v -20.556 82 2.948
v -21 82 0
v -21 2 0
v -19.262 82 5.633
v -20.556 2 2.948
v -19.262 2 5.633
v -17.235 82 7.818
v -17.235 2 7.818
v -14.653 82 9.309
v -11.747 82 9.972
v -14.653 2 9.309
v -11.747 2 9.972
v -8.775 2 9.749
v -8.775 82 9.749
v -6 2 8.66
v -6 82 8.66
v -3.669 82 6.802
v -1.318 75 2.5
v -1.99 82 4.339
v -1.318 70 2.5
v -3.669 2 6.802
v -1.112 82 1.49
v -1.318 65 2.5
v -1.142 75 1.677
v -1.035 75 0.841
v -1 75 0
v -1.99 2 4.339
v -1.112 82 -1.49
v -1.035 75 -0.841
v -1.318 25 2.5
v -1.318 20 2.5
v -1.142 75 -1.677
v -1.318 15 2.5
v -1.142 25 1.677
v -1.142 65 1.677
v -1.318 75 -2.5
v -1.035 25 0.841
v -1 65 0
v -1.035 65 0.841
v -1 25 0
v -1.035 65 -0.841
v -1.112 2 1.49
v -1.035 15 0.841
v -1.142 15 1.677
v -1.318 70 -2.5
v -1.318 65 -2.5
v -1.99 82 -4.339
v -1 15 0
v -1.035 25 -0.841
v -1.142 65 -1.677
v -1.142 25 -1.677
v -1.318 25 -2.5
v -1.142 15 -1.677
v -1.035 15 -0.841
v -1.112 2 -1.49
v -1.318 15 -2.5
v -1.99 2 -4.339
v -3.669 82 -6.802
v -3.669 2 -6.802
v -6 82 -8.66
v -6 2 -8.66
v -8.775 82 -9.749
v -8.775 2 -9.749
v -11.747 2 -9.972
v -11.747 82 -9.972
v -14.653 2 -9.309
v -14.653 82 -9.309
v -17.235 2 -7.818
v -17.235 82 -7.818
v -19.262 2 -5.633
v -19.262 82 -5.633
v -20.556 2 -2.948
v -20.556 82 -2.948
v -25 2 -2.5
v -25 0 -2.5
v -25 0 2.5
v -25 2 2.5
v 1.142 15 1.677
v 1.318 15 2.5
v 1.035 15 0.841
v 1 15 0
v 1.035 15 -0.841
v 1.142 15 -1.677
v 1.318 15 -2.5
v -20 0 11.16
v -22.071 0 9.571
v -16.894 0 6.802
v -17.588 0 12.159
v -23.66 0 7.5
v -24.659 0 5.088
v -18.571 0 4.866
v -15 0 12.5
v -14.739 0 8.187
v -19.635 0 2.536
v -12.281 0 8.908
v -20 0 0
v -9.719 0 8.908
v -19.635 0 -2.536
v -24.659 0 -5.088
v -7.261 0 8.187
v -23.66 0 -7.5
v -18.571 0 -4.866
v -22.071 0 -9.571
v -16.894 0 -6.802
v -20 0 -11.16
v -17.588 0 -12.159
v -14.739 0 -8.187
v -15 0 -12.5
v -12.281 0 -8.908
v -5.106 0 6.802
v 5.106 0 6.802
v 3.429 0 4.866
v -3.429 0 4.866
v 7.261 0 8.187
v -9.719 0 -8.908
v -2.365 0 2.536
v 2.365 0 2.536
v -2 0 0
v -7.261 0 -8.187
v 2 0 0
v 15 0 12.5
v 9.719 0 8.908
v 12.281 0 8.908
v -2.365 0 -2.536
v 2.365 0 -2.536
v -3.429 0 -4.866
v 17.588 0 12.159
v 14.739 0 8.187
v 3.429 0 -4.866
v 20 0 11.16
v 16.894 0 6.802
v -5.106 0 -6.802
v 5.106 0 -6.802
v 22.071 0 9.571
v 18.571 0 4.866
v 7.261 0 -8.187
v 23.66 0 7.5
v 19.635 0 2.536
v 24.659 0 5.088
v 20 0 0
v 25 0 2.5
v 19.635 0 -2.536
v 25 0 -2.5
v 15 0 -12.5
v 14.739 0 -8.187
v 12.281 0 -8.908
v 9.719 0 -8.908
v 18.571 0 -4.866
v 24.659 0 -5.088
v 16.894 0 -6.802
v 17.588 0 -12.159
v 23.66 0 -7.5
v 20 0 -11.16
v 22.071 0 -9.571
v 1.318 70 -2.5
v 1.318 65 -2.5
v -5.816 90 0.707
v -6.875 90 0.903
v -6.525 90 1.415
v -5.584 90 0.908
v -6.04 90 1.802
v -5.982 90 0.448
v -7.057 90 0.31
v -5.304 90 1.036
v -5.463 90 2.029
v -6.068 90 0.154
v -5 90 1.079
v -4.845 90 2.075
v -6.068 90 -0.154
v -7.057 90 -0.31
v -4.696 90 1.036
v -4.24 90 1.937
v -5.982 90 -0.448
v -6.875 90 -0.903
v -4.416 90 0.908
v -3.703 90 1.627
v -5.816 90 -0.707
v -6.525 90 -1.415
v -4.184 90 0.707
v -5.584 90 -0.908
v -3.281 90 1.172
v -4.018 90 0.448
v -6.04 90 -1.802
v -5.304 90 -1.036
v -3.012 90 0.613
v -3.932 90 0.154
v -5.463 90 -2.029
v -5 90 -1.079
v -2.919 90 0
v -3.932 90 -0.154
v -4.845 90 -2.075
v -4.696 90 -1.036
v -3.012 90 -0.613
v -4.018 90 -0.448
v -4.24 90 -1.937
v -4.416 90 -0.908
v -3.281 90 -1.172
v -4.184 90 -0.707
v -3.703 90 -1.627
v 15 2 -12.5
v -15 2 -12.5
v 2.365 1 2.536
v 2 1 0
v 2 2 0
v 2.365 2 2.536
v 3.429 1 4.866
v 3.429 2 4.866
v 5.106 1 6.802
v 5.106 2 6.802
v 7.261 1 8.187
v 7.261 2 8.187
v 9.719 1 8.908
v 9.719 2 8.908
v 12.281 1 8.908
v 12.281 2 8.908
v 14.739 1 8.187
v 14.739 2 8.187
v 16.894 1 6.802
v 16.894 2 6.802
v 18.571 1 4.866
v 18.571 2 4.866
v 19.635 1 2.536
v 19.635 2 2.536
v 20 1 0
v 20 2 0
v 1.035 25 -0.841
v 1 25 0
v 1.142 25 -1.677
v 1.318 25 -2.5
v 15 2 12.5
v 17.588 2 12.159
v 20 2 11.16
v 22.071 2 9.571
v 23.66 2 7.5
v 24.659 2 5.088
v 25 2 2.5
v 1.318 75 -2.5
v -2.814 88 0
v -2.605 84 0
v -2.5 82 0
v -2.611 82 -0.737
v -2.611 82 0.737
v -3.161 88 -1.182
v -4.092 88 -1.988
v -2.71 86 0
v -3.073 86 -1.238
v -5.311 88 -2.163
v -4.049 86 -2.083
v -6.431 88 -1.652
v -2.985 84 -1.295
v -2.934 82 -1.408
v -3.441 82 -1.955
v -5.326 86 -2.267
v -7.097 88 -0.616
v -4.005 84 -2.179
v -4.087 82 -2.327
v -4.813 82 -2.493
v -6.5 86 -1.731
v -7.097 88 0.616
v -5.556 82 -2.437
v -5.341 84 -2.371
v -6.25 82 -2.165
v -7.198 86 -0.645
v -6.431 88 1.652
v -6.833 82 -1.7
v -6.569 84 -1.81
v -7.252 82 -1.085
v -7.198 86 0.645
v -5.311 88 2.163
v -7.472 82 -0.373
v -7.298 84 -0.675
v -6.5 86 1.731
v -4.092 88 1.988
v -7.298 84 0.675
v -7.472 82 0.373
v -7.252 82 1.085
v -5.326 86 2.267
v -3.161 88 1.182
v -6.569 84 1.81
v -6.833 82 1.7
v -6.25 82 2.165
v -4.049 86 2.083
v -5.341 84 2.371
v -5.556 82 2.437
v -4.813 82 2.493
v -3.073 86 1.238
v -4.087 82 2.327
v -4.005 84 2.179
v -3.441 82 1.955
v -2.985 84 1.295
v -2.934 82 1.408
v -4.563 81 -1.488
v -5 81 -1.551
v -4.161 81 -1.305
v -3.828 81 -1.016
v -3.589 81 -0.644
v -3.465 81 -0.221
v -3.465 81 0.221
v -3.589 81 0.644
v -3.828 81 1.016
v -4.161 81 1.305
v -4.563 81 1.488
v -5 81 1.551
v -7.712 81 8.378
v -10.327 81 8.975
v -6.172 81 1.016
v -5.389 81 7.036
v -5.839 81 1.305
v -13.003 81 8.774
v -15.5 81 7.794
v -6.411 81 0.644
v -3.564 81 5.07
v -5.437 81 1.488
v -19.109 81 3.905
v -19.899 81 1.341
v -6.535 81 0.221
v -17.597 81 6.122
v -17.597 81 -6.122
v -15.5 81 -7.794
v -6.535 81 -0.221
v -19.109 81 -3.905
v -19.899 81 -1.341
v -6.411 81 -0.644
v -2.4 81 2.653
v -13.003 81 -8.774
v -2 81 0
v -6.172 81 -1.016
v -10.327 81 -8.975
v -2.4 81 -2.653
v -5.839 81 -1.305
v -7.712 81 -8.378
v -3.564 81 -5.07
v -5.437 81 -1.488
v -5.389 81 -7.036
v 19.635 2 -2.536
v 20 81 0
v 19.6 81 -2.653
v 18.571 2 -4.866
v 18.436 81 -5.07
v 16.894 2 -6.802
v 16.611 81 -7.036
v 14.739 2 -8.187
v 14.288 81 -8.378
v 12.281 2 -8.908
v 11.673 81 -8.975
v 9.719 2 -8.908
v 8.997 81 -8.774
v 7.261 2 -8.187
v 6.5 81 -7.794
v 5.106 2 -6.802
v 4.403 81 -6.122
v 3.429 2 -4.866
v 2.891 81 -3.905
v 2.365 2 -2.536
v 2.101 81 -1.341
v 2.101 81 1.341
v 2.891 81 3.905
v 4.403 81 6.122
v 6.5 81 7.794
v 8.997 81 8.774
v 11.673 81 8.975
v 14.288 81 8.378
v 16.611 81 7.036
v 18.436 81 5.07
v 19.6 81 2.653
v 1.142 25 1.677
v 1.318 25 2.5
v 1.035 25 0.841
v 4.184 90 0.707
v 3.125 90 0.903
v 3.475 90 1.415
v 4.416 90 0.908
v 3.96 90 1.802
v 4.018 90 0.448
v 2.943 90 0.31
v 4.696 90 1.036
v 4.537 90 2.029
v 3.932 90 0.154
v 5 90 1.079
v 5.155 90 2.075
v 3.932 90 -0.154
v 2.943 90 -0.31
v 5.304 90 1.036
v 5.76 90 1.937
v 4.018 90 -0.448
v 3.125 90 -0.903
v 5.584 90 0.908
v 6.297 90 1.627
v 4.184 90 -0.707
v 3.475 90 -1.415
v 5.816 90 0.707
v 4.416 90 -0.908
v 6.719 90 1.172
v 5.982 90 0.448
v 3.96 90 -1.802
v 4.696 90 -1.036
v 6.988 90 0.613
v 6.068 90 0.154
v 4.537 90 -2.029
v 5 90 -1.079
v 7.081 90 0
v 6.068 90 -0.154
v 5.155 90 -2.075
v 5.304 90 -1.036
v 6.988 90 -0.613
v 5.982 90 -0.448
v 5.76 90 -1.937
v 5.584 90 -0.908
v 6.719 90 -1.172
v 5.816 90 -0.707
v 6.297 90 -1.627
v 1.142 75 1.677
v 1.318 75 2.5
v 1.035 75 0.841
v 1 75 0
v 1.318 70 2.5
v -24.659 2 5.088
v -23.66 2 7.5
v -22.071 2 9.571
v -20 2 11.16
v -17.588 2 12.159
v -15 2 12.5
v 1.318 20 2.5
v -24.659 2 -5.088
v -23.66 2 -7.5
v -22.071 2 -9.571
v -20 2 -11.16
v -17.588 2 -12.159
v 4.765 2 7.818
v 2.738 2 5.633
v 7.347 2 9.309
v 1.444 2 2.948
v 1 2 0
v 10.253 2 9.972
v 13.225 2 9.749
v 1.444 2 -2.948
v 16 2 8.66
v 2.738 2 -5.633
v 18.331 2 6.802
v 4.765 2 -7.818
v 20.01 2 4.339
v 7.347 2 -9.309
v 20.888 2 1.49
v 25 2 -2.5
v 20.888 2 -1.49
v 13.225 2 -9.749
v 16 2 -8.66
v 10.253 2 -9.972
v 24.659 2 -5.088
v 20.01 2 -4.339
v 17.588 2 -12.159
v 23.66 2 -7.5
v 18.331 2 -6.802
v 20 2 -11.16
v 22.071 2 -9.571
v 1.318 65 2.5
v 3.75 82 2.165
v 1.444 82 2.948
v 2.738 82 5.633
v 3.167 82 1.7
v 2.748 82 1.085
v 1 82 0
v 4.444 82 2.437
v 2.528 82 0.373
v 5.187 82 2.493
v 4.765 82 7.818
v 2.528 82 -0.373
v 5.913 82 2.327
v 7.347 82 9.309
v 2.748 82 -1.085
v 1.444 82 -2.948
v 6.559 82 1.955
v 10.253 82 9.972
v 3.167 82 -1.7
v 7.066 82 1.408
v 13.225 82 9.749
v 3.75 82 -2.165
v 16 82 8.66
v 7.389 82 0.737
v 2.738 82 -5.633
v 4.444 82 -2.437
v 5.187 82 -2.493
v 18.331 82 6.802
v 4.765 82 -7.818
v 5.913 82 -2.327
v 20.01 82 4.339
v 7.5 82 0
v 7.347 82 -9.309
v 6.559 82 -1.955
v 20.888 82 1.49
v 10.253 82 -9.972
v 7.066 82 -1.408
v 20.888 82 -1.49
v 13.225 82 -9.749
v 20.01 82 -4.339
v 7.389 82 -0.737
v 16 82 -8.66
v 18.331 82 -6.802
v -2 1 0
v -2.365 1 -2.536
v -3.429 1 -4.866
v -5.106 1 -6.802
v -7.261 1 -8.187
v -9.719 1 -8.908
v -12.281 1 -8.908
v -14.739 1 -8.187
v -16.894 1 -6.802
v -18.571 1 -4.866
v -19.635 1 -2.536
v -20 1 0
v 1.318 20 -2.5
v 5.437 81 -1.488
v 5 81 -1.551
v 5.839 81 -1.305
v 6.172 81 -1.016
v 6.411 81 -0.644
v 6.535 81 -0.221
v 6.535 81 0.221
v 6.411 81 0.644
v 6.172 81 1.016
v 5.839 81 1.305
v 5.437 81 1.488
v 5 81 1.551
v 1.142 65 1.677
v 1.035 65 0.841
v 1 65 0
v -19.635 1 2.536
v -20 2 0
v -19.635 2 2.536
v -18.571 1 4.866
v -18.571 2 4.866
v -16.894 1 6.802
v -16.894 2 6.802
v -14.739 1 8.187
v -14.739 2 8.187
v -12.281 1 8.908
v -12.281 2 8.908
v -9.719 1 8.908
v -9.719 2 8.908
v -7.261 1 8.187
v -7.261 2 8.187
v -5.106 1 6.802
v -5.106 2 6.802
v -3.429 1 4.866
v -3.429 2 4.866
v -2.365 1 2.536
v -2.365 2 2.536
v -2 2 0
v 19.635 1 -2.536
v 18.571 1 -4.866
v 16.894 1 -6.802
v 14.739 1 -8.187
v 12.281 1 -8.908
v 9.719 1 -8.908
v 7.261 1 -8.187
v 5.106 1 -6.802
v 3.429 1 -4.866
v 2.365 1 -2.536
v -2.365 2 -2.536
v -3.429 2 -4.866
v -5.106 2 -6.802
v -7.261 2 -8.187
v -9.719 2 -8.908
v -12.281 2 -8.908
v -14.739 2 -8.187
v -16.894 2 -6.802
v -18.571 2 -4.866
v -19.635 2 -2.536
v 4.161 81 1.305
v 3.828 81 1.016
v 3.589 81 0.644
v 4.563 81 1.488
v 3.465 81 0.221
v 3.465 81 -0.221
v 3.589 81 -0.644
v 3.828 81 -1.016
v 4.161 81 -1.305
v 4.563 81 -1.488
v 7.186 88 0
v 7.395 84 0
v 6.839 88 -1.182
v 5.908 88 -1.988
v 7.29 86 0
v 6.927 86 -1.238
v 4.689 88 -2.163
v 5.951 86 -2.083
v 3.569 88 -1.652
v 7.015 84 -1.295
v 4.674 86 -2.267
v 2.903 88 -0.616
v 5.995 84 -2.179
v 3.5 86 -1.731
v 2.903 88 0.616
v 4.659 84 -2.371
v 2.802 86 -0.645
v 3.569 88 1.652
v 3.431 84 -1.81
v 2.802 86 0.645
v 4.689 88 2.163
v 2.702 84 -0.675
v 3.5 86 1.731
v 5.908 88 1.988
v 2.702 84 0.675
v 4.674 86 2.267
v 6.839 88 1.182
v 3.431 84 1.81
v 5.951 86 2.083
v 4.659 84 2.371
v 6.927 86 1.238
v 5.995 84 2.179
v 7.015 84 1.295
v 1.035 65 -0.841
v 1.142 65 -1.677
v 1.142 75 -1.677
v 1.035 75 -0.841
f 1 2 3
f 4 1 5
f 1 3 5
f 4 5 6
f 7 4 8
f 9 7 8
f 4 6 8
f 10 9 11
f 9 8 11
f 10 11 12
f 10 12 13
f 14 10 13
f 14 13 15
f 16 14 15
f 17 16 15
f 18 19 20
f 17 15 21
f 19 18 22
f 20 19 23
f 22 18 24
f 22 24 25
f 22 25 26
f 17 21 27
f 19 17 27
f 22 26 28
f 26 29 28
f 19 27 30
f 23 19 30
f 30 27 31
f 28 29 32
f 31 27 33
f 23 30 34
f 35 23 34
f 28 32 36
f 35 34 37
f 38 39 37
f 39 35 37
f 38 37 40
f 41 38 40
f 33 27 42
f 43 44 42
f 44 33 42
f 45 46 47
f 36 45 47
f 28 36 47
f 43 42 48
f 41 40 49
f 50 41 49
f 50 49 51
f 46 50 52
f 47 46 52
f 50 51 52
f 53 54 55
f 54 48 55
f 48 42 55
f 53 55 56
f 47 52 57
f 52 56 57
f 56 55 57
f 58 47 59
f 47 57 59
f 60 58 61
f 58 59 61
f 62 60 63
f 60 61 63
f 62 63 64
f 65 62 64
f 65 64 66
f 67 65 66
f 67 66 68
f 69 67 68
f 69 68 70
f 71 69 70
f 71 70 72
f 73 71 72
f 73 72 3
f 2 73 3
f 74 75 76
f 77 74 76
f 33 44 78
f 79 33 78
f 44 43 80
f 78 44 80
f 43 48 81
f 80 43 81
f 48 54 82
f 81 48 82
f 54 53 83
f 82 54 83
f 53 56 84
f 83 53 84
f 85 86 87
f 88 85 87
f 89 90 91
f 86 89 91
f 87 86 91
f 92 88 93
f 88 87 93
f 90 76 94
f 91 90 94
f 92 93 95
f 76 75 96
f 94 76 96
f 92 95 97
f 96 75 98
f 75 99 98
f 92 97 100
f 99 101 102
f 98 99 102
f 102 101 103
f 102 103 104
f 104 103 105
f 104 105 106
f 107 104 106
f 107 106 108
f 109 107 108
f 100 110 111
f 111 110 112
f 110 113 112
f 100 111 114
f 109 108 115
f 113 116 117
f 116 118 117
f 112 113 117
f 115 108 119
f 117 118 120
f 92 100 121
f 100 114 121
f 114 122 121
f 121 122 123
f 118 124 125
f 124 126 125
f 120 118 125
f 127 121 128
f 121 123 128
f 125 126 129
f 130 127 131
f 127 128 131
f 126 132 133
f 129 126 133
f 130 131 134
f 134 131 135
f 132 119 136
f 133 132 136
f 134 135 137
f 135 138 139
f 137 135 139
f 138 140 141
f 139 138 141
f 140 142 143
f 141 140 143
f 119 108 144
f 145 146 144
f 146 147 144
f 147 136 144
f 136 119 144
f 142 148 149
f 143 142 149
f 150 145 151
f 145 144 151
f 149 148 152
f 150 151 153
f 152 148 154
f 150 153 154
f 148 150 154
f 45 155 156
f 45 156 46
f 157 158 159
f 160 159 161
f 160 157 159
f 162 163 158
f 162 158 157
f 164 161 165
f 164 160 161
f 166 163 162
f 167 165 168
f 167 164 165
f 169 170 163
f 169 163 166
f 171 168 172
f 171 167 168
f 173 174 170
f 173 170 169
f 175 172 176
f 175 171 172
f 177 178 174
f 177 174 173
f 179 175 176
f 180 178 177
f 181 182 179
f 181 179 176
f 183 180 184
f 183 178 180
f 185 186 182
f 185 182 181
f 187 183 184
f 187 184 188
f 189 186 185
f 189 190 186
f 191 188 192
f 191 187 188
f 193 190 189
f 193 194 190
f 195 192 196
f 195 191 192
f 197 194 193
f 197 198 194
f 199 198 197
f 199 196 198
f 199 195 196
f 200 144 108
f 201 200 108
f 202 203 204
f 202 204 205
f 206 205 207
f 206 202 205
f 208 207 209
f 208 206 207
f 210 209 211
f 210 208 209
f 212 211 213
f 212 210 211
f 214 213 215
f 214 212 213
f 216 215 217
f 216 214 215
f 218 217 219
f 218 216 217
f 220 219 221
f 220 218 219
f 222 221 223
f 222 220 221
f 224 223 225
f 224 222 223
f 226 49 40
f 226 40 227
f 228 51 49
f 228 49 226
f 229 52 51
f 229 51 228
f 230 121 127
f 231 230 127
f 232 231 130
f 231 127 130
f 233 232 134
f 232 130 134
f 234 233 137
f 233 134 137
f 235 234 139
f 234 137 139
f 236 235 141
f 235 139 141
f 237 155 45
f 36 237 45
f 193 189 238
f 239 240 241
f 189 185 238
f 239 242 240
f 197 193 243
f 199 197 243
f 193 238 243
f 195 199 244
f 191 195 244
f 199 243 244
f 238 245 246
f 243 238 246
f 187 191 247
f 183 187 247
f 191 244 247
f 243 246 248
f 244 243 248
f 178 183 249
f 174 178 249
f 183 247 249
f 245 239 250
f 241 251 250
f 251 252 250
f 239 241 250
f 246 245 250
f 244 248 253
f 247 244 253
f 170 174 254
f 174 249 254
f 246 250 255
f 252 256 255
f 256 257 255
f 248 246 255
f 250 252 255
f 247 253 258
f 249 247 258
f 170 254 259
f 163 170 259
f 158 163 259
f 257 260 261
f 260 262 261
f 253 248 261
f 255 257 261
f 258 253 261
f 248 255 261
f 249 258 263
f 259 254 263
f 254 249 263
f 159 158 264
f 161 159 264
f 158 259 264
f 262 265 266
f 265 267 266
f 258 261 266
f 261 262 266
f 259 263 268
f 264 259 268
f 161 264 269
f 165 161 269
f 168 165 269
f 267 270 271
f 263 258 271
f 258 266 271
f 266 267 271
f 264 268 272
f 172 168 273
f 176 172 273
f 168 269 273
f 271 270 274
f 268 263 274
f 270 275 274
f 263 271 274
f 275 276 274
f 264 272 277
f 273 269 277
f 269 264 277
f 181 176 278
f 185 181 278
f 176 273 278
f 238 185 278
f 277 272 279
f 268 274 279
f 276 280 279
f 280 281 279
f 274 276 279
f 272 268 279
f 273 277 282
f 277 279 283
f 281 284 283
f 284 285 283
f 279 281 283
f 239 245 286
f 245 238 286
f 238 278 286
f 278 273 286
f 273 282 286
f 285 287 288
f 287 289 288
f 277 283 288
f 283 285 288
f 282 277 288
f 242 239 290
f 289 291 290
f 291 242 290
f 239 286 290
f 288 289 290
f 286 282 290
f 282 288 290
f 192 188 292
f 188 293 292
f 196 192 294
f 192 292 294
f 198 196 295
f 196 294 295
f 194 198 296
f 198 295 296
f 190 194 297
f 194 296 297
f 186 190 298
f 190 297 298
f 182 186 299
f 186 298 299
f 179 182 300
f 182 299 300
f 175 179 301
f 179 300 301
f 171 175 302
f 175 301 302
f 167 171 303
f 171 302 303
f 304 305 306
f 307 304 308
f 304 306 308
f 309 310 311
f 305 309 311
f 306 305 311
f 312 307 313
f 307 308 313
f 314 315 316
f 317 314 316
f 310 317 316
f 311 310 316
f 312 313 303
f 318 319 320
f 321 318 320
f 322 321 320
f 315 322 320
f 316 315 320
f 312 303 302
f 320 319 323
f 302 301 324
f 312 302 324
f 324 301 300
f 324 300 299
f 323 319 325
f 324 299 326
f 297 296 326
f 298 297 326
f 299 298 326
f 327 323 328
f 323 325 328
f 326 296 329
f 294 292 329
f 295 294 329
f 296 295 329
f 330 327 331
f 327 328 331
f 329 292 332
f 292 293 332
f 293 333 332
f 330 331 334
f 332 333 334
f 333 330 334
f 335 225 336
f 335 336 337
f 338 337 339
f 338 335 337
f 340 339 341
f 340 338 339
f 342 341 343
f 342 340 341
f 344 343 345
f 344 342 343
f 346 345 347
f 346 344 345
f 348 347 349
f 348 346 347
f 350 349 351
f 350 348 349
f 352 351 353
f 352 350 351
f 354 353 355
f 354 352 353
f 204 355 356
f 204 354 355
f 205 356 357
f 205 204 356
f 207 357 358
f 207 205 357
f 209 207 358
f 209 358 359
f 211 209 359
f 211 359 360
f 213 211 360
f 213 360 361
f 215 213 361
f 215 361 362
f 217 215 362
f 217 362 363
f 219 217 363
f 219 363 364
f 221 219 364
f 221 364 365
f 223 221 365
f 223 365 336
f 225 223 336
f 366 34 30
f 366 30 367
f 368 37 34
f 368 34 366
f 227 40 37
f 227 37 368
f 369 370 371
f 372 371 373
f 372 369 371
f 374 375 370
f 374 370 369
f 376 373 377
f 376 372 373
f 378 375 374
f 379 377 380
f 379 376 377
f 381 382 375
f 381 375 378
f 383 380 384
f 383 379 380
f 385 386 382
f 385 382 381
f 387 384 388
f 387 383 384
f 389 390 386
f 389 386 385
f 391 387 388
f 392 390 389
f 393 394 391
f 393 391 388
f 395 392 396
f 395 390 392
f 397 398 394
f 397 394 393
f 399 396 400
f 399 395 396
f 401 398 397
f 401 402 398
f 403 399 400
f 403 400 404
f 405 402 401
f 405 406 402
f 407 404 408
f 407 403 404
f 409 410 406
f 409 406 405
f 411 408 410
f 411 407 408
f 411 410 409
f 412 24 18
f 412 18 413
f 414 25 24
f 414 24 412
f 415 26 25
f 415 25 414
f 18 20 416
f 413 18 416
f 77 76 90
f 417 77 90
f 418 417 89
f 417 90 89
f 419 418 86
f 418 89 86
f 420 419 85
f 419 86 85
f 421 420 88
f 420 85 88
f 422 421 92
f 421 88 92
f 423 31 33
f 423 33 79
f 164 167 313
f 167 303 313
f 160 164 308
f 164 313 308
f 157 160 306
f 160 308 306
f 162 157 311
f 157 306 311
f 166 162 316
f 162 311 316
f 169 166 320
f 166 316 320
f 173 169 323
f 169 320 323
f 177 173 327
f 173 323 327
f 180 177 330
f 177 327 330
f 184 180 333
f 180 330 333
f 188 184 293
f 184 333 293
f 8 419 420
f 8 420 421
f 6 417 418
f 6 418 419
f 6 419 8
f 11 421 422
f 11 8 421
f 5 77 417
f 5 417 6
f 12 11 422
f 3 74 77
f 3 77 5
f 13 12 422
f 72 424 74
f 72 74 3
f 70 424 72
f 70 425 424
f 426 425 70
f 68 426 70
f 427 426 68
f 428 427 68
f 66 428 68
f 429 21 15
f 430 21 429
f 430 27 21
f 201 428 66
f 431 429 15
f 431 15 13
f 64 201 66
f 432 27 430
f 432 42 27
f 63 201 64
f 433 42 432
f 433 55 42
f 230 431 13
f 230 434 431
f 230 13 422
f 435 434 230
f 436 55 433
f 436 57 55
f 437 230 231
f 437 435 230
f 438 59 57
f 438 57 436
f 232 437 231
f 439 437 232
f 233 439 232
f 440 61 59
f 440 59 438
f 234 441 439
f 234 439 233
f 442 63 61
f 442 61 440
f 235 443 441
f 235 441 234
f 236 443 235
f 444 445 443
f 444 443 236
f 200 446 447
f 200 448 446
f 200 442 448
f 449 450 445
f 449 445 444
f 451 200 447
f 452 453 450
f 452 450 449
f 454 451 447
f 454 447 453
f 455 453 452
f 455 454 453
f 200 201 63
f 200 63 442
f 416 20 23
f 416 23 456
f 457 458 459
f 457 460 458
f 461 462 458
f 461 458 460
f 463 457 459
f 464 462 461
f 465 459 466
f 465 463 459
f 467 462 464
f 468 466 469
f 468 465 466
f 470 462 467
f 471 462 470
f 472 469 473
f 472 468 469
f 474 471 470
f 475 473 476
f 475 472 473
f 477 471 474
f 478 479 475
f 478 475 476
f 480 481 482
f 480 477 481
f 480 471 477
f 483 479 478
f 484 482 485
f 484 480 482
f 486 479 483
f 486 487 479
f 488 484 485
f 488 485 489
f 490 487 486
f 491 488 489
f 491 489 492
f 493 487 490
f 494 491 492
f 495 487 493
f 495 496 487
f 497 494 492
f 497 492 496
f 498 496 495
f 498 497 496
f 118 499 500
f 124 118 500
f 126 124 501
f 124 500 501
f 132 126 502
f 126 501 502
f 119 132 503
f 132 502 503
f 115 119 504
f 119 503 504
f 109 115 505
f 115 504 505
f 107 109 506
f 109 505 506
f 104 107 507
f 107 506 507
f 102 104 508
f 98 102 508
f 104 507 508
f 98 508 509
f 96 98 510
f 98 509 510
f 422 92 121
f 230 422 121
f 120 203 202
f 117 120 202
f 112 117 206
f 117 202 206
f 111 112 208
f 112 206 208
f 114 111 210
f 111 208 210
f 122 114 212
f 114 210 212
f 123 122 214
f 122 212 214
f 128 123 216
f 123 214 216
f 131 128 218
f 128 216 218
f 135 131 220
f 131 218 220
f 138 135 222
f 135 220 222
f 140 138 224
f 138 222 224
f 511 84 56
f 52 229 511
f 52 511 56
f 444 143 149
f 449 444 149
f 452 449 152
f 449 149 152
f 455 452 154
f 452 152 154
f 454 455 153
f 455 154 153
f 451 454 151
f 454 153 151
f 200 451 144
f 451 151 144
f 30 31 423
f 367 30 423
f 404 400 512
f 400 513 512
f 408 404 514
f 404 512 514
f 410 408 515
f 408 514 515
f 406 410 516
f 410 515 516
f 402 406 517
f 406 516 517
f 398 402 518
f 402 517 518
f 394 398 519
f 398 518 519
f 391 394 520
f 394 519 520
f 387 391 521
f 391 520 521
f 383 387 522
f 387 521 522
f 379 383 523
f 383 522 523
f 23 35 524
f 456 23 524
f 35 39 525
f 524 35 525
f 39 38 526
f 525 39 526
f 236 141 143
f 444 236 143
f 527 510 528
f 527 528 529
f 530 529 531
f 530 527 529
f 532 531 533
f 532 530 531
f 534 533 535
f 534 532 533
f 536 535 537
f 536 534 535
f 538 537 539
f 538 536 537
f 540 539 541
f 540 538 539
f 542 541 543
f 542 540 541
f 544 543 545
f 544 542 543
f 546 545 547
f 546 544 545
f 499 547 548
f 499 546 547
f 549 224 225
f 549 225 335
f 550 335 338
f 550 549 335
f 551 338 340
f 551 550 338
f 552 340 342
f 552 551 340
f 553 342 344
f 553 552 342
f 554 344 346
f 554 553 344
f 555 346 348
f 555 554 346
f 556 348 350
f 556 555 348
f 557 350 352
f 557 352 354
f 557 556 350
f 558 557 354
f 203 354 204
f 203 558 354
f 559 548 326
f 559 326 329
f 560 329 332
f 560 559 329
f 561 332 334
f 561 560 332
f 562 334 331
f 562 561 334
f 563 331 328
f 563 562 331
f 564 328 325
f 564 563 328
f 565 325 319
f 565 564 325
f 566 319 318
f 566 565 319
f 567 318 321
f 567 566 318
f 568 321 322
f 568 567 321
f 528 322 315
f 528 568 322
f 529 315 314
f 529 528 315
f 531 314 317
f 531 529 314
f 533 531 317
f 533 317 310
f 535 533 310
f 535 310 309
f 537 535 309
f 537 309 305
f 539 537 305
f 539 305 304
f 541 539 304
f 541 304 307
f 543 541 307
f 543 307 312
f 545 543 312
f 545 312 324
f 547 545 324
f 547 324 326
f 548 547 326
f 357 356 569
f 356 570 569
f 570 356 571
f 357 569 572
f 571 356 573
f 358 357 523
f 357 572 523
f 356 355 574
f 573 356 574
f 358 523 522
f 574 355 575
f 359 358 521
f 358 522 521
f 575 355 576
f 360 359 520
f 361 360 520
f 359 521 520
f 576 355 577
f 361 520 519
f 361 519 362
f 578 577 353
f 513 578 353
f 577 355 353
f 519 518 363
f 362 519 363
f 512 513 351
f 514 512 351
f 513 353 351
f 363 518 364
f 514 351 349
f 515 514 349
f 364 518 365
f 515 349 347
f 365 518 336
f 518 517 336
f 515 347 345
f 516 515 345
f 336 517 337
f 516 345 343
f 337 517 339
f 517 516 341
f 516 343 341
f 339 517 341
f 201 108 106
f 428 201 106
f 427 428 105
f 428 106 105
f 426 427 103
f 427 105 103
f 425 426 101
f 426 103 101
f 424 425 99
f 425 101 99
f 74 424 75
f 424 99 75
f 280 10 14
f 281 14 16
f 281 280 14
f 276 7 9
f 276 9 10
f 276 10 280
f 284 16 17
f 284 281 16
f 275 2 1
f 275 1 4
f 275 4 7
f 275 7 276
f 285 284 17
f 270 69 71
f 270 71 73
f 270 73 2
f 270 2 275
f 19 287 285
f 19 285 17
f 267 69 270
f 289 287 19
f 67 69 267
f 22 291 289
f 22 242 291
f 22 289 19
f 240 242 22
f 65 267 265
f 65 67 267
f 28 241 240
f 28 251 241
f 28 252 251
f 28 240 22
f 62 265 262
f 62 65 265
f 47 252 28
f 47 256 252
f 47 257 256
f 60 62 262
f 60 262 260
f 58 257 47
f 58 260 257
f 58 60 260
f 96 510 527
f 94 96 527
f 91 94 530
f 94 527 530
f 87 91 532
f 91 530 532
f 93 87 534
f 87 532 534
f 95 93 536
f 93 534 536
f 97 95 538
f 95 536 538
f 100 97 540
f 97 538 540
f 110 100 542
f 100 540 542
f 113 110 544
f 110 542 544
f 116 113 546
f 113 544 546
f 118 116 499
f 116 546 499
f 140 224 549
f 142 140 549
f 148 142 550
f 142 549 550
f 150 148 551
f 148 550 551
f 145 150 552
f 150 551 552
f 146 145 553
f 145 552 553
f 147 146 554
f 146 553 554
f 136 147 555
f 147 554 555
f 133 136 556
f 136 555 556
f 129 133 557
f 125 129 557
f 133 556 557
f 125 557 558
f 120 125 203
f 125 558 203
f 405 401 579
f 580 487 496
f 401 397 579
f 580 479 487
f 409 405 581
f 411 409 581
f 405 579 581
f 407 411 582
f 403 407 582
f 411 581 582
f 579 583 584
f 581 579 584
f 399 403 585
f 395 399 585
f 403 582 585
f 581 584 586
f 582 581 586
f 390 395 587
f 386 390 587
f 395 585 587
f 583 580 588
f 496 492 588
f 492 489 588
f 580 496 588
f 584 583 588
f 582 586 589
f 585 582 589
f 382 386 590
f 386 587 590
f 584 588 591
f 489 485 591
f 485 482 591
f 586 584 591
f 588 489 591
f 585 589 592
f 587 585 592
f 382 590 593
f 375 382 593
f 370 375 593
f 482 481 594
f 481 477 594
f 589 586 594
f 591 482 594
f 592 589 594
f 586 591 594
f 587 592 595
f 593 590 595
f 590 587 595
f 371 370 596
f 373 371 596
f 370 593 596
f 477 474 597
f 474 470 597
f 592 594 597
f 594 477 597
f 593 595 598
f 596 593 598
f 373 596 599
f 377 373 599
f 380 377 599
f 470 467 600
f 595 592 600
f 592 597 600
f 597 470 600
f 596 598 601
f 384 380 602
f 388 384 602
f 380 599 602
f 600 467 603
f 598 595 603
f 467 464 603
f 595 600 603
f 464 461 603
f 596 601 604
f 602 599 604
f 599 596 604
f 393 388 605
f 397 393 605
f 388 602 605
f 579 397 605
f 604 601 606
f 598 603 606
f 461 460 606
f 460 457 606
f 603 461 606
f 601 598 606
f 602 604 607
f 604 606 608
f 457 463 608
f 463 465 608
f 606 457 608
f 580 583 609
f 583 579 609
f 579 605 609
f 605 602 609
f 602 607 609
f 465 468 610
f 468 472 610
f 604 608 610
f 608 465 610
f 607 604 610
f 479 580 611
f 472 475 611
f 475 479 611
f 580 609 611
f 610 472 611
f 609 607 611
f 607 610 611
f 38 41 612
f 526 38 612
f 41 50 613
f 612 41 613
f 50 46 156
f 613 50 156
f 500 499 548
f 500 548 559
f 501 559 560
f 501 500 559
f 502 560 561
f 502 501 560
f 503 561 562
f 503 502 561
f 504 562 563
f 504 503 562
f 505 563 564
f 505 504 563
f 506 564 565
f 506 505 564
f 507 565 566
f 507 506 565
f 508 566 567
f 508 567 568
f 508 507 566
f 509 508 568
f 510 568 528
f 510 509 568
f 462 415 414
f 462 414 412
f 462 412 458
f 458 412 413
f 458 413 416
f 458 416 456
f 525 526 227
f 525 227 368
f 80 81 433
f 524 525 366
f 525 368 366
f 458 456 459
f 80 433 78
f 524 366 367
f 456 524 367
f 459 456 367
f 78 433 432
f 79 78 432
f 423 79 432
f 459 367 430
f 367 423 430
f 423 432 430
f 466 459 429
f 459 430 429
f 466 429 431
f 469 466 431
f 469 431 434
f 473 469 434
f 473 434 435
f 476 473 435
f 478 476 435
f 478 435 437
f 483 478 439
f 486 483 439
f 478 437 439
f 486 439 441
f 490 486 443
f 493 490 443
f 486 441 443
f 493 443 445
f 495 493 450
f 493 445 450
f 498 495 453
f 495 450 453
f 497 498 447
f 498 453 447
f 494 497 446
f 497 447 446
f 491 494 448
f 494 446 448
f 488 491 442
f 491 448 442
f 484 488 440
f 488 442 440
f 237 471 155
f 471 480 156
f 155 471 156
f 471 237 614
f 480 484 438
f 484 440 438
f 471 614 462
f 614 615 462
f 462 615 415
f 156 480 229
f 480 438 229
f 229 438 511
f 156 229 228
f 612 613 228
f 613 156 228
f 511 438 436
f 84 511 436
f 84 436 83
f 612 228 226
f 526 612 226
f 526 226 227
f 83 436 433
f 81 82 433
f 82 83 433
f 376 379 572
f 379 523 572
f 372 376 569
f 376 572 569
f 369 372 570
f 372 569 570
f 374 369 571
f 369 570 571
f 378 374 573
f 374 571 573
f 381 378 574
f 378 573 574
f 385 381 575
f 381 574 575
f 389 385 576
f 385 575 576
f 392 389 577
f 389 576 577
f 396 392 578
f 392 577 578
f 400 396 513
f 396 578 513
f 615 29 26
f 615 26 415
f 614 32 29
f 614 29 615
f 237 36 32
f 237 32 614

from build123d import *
from build123d.topology import SkipClean

# Parameters (mm, degrees)
BOSS_EXTRUDE1_DEPTH           = 2
BOSS_EXTRUDE2_DEPTH           = 80
SKETCH3_R                     = 2.5
BOSS_EXTRUDE3_DEPTH           = 8
BOSS_EXTRUDE3_DRAFT           = 3
BOSS_EXTRUDE3_PROFILE_2_DEPTH = 8
BOSS_EXTRUDE3_PROFILE_2_DRAFT = 3
SHELL2_START                  = 1
SHELL2_OUTLINE_R              = 9
SHELL2_DEPTH                  = 80
CUT_EXTRUDE1_DEPTH            = 93.332280474
BOSS_EXTRUDE4_DEPTH           = 5
BOSS_EXTRUDE5_DEPTH           = 5


with BuildPart() as part:
    # Sketch1 → Boss-Extrude1 (new body)
    with BuildSketch(Plane(origin=(0, 0, 0), x_dir=(1, 0, 0), z_dir=(0, 1, 0))):
        with BuildLine():
            Line((-15, -12.5), (15, -12.5))
            ThreePointArc((15, -12.5), (22.071067812, -9.571067812), (25, -2.5))
            Line((25, -2.5), (25, 2.5))
            ThreePointArc((25, 2.5), (22.071067812, 9.571067812), (15, 12.5))
            Line((15, 12.5), (-15, 12.5))
            ThreePointArc((-15, 12.5), (-22.071067812, 9.571067812), (-25, 2.5))
            Line((-25, 2.5), (-25, -2.5))
            ThreePointArc((-25, -2.5), (-22.071067812, -9.571067812), (-15, -12.5))
        make_face()
    extrude(amount=BOSS_EXTRUDE1_DEPTH)

    # Sketch2 → Boss-Extrude2 (add)
    with BuildSketch(Plane(origin=(0, 2, 0), x_dir=(1, 0, 0), z_dir=(0, 1, 0))):
        with BuildLine():
            ThreePointArc((-20, 0), (-11, 9), (-2, 0))
            Line((-2, 0), (-1, 0))
            ThreePointArc((-1, 0), (-11, 10), (-21, 0))
            Line((-21, 0), (-20, 0))
        make_face()
        with BuildLine():
            Line((-1, 0), (-2, 0))
            ThreePointArc((-2, 0), (-11, -9), (-20, 0))
            Line((-20, 0), (-21, 0))
            ThreePointArc((-21, 0), (-11, -10), (-1, 0))
        make_face()
        with BuildLine():
            ThreePointArc((21, 0), (11, 10), (1, 0))
            Line((1, 0), (2, 0))
            ThreePointArc((2, 0), (11, 9), (20, 0))
            Line((20, 0), (21, 0))
        make_face()
        with BuildLine():
            Line((2, 0), (1, 0))
            ThreePointArc((1, 0), (11, -10), (21, 0))
            Line((21, 0), (20, 0))
            ThreePointArc((20, 0), (11, -9), (2, 0))
        make_face()
        with BuildLine():
            ThreePointArc((20, 0), (11, 9), (2, 0))
            Line((2, 0), (20, 0))
        make_face()
        with BuildLine():
            Line((20, 0), (2, 0))
            ThreePointArc((2, 0), (11, -9), (20, 0))
        make_face()
        with BuildLine():
            ThreePointArc((-20, 0), (-11, -9), (-2, 0))
            Line((-2, 0), (-20, 0))
        make_face()
        with BuildLine():
            Line((-20, 0), (-2, 0))
            ThreePointArc((-2, 0), (-11, 9), (-20, 0))
        make_face()
    extrude(amount=BOSS_EXTRUDE2_DEPTH)


with BuildPart() as boss_extrude3_tool:
    # Sketch3 → Boss-Extrude3 (with draft: the straight prism first)
    with BuildSketch(Plane(origin=(0, 82, 0), x_dir=(1, 0, 0), z_dir=(0, 1, 0))):
        with Locations((-5, 0)):
            Circle(SKETCH3_R)
    extrude(amount=BOSS_EXTRUDE3_DEPTH)
    # Boss-Extrude3: the draft: its side faces are tilted about the plane it starts from
    boss_extrude3_sides = [boss_extrude3_tool.faces().sort_by_distance(p)[0] for p in [
        (-7.5, 86, 0),
    ]]
    draft(boss_extrude3_sides, Plane(origin=(0, 82, 0), x_dir=(1, 0, 0), z_dir=(0, 1, 0)), BOSS_EXTRUDE3_DRAFT)


with BuildPart() as part_1:
    add(part.part)

    # Boss-Extrude3: add boss_extrude3_tool
    add(boss_extrude3_tool.part)


with BuildPart() as boss_extrude3_profile_2_tool:
    # Sketch3 → Boss-Extrude3 profile 2 (with draft: the straight prism first)
    with BuildSketch(Plane(origin=(0, 82, 0), x_dir=(1, 0, 0), z_dir=(0, 1, 0))):
        with Locations((5, 0)):
            Circle(SKETCH3_R)
    extrude(amount=BOSS_EXTRUDE3_PROFILE_2_DEPTH)
    # Boss-Extrude3 profile 2: the draft: its side faces are tilted about the plane it starts from
    boss_extrude3_profile_2_sides = [boss_extrude3_profile_2_tool.faces().sort_by_distance(p)[0] for p in [
        (2.5, 86, 0),
    ]]
    draft(boss_extrude3_profile_2_sides, Plane(origin=(0, 82, 0), x_dir=(1, 0, 0), z_dir=(0, 1, 0)), BOSS_EXTRUDE3_PROFILE_2_DRAFT)


with BuildPart() as part_2:
    add(part_1.part)

    # Boss-Extrude3 profile 2: add boss_extrude3_profile_2_tool
    add(boss_extrude3_profile_2_tool.part)

    # Shell2: read off the stored shape, not the designer's step
    # Shell2 outline → Shell2 (cut)
    with BuildSketch(Plane(origin=(0, 0, 0), x_dir=(1, 0, 0), z_dir=(0, 1, 0)).offset(SHELL2_START)):
        with Locations((11, 0)):
            Circle(SHELL2_OUTLINE_R)
        with Locations((-11, 0)):
            Circle(SHELL2_OUTLINE_R)
    extrude(amount=SHELL2_DEPTH, mode=Mode.SUBTRACT)

    # Shell2 2: loft between two sections, ruled curve by curve
    shell2_2_from = [
        Edge.make_three_point_arc((5, 90, 1.07936542), (3.92063458, 90, 0), (5, 90, -1.07936542)),
        Edge.make_three_point_arc((5, 90, -1.07936542), (6.07936542, 90, 0), (5, 90, 1.07936542)),
    ]
    shell2_2_to = [
        Edge.make_three_point_arc((5, 81, 1.551035433), (3.448964567, 81, 0), (5, 81, -1.551035433)),
        Edge.make_three_point_arc((5, 81, -1.551035433), (6.551035433, 81, 0), (5, 81, 1.551035433)),
    ]
    shell2_2 = Solid(Shell([*[Face.make_surface_from_curves(shell2_2_from[k], shell2_2_to[k]) for k in range(2)], Face(Wire(shell2_2_from)), Face(Wire(shell2_2_to))]))
    add(shell2_2, mode=Mode.SUBTRACT)

    # Shell2 3: loft between two sections, ruled curve by curve
    shell2_3_from = [
        Edge.make_three_point_arc((-5, 90, 1.07936542), (-6.07936542, 90, 0), (-5, 90, -1.07936542)),
        Edge.make_three_point_arc((-5, 90, -1.07936542), (-3.92063458, 90, 0), (-5, 90, 1.07936542)),
    ]
    shell2_3_to = [
        Edge.make_three_point_arc((-5, 81, 1.551035433), (-6.551035433, 81, 0), (-5, 81, -1.551035433)),
        Edge.make_three_point_arc((-5, 81, -1.551035433), (-3.448964567, 81, 0), (-5, 81, 1.551035433)),
    ]
    shell2_3 = Solid(Shell([*[Face.make_surface_from_curves(shell2_3_from[k], shell2_3_to[k]) for k in range(2)], Face(Wire(shell2_3_from)), Face(Wire(shell2_3_to))]))
    add(shell2_3, mode=Mode.SUBTRACT)

    # Sketch2<3> → Cut-Extrude1 (cut, through all)
    with SkipClean():  # the faces are left unmerged after this step: merging them gives an invalid solid
        with BuildSketch(Plane(origin=(0, 2, 0), x_dir=(1, 0, 0), z_dir=(0, 1, 0))):
            with BuildLine():
                ThreePointArc((-20, 0), (-11, -9), (-2, 0))
                Line((-2, 0), (-20, 0))
            make_face()
            with BuildLine():
                Line((-20, 0), (-2, 0))
                ThreePointArc((-2, 0), (-11, 9), (-20, 0))
            make_face()
            with BuildLine():
                ThreePointArc((20, 0), (11, 9), (2, 0))
                Line((2, 0), (20, 0))
            make_face()
            with BuildLine():
                Line((20, 0), (2, 0))
                ThreePointArc((2, 0), (11, -9), (20, 0))
            make_face()
        extrude(amount=-CUT_EXTRUDE1_DEPTH, mode=Mode.SUBTRACT)

    # Sketch4 → Boss-Extrude4 (add, symmetric)
    with SkipClean():  # the faces are left unmerged after this step: merging them gives an invalid solid
        with BuildSketch(Plane(origin=(0, 20, 0), x_dir=(1, 0, 0), z_dir=(0, 1, 0))):
            with BuildLine():
                Line((1, 0), (-1, 0))
                ThreePointArc((-1, 0), (-1.079703037, -1.260042925), (-1.317541634, -2.5))
                Line((-1.317541634, -2.5), (1.317541634, -2.5))
                ThreePointArc((1.317541634, -2.5), (1.079703037, -1.260042925), (1, 0))
            make_face()
            with BuildLine():
                ThreePointArc((-1.317541634, 2.5), (-1.079703037, 1.260042925), (-1, 0))
                Line((-1, 0), (1, 0))
                ThreePointArc((1, 0), (1.079703037, 1.260042925), (1.317541634, 2.5))
                Line((1.317541634, 2.5), (-1.317541634, 2.5))
            make_face()
        extrude(amount=BOSS_EXTRUDE4_DEPTH, both=True)

    # Sketch7 → Boss-Extrude5 (add, symmetric)
    with SkipClean():  # the faces are left unmerged after this step: merging them gives an invalid solid
        with BuildSketch(Plane(origin=(0, 70, 0), x_dir=(1, 0, 0), z_dir=(0, 1, 0))):
            with BuildLine():
                ThreePointArc((-1.317541634, 2.5), (-1.079703037, 1.260042925), (-1, 0))
                Line((-1, 0), (1, 0))
                ThreePointArc((1, 0), (1.079703037, 1.260042925), (1.317541634, 2.5))
                Line((1.317541634, 2.5), (-1.317541634, 2.5))
            make_face()
            with BuildLine():
                Line((1, 0), (-1, 0))
                ThreePointArc((-1, 0), (-1.079703037, -1.260042925), (-1.317541634, -2.5))
                Line((-1.317541634, -2.5), (1.317541634, -2.5))
                ThreePointArc((1.317541634, -2.5), (1.079703037, -1.260042925), (1, 0))
            make_face()
        extrude(amount=BOSS_EXTRUDE5_DEPTH, both=True)


solid = part_2.part
